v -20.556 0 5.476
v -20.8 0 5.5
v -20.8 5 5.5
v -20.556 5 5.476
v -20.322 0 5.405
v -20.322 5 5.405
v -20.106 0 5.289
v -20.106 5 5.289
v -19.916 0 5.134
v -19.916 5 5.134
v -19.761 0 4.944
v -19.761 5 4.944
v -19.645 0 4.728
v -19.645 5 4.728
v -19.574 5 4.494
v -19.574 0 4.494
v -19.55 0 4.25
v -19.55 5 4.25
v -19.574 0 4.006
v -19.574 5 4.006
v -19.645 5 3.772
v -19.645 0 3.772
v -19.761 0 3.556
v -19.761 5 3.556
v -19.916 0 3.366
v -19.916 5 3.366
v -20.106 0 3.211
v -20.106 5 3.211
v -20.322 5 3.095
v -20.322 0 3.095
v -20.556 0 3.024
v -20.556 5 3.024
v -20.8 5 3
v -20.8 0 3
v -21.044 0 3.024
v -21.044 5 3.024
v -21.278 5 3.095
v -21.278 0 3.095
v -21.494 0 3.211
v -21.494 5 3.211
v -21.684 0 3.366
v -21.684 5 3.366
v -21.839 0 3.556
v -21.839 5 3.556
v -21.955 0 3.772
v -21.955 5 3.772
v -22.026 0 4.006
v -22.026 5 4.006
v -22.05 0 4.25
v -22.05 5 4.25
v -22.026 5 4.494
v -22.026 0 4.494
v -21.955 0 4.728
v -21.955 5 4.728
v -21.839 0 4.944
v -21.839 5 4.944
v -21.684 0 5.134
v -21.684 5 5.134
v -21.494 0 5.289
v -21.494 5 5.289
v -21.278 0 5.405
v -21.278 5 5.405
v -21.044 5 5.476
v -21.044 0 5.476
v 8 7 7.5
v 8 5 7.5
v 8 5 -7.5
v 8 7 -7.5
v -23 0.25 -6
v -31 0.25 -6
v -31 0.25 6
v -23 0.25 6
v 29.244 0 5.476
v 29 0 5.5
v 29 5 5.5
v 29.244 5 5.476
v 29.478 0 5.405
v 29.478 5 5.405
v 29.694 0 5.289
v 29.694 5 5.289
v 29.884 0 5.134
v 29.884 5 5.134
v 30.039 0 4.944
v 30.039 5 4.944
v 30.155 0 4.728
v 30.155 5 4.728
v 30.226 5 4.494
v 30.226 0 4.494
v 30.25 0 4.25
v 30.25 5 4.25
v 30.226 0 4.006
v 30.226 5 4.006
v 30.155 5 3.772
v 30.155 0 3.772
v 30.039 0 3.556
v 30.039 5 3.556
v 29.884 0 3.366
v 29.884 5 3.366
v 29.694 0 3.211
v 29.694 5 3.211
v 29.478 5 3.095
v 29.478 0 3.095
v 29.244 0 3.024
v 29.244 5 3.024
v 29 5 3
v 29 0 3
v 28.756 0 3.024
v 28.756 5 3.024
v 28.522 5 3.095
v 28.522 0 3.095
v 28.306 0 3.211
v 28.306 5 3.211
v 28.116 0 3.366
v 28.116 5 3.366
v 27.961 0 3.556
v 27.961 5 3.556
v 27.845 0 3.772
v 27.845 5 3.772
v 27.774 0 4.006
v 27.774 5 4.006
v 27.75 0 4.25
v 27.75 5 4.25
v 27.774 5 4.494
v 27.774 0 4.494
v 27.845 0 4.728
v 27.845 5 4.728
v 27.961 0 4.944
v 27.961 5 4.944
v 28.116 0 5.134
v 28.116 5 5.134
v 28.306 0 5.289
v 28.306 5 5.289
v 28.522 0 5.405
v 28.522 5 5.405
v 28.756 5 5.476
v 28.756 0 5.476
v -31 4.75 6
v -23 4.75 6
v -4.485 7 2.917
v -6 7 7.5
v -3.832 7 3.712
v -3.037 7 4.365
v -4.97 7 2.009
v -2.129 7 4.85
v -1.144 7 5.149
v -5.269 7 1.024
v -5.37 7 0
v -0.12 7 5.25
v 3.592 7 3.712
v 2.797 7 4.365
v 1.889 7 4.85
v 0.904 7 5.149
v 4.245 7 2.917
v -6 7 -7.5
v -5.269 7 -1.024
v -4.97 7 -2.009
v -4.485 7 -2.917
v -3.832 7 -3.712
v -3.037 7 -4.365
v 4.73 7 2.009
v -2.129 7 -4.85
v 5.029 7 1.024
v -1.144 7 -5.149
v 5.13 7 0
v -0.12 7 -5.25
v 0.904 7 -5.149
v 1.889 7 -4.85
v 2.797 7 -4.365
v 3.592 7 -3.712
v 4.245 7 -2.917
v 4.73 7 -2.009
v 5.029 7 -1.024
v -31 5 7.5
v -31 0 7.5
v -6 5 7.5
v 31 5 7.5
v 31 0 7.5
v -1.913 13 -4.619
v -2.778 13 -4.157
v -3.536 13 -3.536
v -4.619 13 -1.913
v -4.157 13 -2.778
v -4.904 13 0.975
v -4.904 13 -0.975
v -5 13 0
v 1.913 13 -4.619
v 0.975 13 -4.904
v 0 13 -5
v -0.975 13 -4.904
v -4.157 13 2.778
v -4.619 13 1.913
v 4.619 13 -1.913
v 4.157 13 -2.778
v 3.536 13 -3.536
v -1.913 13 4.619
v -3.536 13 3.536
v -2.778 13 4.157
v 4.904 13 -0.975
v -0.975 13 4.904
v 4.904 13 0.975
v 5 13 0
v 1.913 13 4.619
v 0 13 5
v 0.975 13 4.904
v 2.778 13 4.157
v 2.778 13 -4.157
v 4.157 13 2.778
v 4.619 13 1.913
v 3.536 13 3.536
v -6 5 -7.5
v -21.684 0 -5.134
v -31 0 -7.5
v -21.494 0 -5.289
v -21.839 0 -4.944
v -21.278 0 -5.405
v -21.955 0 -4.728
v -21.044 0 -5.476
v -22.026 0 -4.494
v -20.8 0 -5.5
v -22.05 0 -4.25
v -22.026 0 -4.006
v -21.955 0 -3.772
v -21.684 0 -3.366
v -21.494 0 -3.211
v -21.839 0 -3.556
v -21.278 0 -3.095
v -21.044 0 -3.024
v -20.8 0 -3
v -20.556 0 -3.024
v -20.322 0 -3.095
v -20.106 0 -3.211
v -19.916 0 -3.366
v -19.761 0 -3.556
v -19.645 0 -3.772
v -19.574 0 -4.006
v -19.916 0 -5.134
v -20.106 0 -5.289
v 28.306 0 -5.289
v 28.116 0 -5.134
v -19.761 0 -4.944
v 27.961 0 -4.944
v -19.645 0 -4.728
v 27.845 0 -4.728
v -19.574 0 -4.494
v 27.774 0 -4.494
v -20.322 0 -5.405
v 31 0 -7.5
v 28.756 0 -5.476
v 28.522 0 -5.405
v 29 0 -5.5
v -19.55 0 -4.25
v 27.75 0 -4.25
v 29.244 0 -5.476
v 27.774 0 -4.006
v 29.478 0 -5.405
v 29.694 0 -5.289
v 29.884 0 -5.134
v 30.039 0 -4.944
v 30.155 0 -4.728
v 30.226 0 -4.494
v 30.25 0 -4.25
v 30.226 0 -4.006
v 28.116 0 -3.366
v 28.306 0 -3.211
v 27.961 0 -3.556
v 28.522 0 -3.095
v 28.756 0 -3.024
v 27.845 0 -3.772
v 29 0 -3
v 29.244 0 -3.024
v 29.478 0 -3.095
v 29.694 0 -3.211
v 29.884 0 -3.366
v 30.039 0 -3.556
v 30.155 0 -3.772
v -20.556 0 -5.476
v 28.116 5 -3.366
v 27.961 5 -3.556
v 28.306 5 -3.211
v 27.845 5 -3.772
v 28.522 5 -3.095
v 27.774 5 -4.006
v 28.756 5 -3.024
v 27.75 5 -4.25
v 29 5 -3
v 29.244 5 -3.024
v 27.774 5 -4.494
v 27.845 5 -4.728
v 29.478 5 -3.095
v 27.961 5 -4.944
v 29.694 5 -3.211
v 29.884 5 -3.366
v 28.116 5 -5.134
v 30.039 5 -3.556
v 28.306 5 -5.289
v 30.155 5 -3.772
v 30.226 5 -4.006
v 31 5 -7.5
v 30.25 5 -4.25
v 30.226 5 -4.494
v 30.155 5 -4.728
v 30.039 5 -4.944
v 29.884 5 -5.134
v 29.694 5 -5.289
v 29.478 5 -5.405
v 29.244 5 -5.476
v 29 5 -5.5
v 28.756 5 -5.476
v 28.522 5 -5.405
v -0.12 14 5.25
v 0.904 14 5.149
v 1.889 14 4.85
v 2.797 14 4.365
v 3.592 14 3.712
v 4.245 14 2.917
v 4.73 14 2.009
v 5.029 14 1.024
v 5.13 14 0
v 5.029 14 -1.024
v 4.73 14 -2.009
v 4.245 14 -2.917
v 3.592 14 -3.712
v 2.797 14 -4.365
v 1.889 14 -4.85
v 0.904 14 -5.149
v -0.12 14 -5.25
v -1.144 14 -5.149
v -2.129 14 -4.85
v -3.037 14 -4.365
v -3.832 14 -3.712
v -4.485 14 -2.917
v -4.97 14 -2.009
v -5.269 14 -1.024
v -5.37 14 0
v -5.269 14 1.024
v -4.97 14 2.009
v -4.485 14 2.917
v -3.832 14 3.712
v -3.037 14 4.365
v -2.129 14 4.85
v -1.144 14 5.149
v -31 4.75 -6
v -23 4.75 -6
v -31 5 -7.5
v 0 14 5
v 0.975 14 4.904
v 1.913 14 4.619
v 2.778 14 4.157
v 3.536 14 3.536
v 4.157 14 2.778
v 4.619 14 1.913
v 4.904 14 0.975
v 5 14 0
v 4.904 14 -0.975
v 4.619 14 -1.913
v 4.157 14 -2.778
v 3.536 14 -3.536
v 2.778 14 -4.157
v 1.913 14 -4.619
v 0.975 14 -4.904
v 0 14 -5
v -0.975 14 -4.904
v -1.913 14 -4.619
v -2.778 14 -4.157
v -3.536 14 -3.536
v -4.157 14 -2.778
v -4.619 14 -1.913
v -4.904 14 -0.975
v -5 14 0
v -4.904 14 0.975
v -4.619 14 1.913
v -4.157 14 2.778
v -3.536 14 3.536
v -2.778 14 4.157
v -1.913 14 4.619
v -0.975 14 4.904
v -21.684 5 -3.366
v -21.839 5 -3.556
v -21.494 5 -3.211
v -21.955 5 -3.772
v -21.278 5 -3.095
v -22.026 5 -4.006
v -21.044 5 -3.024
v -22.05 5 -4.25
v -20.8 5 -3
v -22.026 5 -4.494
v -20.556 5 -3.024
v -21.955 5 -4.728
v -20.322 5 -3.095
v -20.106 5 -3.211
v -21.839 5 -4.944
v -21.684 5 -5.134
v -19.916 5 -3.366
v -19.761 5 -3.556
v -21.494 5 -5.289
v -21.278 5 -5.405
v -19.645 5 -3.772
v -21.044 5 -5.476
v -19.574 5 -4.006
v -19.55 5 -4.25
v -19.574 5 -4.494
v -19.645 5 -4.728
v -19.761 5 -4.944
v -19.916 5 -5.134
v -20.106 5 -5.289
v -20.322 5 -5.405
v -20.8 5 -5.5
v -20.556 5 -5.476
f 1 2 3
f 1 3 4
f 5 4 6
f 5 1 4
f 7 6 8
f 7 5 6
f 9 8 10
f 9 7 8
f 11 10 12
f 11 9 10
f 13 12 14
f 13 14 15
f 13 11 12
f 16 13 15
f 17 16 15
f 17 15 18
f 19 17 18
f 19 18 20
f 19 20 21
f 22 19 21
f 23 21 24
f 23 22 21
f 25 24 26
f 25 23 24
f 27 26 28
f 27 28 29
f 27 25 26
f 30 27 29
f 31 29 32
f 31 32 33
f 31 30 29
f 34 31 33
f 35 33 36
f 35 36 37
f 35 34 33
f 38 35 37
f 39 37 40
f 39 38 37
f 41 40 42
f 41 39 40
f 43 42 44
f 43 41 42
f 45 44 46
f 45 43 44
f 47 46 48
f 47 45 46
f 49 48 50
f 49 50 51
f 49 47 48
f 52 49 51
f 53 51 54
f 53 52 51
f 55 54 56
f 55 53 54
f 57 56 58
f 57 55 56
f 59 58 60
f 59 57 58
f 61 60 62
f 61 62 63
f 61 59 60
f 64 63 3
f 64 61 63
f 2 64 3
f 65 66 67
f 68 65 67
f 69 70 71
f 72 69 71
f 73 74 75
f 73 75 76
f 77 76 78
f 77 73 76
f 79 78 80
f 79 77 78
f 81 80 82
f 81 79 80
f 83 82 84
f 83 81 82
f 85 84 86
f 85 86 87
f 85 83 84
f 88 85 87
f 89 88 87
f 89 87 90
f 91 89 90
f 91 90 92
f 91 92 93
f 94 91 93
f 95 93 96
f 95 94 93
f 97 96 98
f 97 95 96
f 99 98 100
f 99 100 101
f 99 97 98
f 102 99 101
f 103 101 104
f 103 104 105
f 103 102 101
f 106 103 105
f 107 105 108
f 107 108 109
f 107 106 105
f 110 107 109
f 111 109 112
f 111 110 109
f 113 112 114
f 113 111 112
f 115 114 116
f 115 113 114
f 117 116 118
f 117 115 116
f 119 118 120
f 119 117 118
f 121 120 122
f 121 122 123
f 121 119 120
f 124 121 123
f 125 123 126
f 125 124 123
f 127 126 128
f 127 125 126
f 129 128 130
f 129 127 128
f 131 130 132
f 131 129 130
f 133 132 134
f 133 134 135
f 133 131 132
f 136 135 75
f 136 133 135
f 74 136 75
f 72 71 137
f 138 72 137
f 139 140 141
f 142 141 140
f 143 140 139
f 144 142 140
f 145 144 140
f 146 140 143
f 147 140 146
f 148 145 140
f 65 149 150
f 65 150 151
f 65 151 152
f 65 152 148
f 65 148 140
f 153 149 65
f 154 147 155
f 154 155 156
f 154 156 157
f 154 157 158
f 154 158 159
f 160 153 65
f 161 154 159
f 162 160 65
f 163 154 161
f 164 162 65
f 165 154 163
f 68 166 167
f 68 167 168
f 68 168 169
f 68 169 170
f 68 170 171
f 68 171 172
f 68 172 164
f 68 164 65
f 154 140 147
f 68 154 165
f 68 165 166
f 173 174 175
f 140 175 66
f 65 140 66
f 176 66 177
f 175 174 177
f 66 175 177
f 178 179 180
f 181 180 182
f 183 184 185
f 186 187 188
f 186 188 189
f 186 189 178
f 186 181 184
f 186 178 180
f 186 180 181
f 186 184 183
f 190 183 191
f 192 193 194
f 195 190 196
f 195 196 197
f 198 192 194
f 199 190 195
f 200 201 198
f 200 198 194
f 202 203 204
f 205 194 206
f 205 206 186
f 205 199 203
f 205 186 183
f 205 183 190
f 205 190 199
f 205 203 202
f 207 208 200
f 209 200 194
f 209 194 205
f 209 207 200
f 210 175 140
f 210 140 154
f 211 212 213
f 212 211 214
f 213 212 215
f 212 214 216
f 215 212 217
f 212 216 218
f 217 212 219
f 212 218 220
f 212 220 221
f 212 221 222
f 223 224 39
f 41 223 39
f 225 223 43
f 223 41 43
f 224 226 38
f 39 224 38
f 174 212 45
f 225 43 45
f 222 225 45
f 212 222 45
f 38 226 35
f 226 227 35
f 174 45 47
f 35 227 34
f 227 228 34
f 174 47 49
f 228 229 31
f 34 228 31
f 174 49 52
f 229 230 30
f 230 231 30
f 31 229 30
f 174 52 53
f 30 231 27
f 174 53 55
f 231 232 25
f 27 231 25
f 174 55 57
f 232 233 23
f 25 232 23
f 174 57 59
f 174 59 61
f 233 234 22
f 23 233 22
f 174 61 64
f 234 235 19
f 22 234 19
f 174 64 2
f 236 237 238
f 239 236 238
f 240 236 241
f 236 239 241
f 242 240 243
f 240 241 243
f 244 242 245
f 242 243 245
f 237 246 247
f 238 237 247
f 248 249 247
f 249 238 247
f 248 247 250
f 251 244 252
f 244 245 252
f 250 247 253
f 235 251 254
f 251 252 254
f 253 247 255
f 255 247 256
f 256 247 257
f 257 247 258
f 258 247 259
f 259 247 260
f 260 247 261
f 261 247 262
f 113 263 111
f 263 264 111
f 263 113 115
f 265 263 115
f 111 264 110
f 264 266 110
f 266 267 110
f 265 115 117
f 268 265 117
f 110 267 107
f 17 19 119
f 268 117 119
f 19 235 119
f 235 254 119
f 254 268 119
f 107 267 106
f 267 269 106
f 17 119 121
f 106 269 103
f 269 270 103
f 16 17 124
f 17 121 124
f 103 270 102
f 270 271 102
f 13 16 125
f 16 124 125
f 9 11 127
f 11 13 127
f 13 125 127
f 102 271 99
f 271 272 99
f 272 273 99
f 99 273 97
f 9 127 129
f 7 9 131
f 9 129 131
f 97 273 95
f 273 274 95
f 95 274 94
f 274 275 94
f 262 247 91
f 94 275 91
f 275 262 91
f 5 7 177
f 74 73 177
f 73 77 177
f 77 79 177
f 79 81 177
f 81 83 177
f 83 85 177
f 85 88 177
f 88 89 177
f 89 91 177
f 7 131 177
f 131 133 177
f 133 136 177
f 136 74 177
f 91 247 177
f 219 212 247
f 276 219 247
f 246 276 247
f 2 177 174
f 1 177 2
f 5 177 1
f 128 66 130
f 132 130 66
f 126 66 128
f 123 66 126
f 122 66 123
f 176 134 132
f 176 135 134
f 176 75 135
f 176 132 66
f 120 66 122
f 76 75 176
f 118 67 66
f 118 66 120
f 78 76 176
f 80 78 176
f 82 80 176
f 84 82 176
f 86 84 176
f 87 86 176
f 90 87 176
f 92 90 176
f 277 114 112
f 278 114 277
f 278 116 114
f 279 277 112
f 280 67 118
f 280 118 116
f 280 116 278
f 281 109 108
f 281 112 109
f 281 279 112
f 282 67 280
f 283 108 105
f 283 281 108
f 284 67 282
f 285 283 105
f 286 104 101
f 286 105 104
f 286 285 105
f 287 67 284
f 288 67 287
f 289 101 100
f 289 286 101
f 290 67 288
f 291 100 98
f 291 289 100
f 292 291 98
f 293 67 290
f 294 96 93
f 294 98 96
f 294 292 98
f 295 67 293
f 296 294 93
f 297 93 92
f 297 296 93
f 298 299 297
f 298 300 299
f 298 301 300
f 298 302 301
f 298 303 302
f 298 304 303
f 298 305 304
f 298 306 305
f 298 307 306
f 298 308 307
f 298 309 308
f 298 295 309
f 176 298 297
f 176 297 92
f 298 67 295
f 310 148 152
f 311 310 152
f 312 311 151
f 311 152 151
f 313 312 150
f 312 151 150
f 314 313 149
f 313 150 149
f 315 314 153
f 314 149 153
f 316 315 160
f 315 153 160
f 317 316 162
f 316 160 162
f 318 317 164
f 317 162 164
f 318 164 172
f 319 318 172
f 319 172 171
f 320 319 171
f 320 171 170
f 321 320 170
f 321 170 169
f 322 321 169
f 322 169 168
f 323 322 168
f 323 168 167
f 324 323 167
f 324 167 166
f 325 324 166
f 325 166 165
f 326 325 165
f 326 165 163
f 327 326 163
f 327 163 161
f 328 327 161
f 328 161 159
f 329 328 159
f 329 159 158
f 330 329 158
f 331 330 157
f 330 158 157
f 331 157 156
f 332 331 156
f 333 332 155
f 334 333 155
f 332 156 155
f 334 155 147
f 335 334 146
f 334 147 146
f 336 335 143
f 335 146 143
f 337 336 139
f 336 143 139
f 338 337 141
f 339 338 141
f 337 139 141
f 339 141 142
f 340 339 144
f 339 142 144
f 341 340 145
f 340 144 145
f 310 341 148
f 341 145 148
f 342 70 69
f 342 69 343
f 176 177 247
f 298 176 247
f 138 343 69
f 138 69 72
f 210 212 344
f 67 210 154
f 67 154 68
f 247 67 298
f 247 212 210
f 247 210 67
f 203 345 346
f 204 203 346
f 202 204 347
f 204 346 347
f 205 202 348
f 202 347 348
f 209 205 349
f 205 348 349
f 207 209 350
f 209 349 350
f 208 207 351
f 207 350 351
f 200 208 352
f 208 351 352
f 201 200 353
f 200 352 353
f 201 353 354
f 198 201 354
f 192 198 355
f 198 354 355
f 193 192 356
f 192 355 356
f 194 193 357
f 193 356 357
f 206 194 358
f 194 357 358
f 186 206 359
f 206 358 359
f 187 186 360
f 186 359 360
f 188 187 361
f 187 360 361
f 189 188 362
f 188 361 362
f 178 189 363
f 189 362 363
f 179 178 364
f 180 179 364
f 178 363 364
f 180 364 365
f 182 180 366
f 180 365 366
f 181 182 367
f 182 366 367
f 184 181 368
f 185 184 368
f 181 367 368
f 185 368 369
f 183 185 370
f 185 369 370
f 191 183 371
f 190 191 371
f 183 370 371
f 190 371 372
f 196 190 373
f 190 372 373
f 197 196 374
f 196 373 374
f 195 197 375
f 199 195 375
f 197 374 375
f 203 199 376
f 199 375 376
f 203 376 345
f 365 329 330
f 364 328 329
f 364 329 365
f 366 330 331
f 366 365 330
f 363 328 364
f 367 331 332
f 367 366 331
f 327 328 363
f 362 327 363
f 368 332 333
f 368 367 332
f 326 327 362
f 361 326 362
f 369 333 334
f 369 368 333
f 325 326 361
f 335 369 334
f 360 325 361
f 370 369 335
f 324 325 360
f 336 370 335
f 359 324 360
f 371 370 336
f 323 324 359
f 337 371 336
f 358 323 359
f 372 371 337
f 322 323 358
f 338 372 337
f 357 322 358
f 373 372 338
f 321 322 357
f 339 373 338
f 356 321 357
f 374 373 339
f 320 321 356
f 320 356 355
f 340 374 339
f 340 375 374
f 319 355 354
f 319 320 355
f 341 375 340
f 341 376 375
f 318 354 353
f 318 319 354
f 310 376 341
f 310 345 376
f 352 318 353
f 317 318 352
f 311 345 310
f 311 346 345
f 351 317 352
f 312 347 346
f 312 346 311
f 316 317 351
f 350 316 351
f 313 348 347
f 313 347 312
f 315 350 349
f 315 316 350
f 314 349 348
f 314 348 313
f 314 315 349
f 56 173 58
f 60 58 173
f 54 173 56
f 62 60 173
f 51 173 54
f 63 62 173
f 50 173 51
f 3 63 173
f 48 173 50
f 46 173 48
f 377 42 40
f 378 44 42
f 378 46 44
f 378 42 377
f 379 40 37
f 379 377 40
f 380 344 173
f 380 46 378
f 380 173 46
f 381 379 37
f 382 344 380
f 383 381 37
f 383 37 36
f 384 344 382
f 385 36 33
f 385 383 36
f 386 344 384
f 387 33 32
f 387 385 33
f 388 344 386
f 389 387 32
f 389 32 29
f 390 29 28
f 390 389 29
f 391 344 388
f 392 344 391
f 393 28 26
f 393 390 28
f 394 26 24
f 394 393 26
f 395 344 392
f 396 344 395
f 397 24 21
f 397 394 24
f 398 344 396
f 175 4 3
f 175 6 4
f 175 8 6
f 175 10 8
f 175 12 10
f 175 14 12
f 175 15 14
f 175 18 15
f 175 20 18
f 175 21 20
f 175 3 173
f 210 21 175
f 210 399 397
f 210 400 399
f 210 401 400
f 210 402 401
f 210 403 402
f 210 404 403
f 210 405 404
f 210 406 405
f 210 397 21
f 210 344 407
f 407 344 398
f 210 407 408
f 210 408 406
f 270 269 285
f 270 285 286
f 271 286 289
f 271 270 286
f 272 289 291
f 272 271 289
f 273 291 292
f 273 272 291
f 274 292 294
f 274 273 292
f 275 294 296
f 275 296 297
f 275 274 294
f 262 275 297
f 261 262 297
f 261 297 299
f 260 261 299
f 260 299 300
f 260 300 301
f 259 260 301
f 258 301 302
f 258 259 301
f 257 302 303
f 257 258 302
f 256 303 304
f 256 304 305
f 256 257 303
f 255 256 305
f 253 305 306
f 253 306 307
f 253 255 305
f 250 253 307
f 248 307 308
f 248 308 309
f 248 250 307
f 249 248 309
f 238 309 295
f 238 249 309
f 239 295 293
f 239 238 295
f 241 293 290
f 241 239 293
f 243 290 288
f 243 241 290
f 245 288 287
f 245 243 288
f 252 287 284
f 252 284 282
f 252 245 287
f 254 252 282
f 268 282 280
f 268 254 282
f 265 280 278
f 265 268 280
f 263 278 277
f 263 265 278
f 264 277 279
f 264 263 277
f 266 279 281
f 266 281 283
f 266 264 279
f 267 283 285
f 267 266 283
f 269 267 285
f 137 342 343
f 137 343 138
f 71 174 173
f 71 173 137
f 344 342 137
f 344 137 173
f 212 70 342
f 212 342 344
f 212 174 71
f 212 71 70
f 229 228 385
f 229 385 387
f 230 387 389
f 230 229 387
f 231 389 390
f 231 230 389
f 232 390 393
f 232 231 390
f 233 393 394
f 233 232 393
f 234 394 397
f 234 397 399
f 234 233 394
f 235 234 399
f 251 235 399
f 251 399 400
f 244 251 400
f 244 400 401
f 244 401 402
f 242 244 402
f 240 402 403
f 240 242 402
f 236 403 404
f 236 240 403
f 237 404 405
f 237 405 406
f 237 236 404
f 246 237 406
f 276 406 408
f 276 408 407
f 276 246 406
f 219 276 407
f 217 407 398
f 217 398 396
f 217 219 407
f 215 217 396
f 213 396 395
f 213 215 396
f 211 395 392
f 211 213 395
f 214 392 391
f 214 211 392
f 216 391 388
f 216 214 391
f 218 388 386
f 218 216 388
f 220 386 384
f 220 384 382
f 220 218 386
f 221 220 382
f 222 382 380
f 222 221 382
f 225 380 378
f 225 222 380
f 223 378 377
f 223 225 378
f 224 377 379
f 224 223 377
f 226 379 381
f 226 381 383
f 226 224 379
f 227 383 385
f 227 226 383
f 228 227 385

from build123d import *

# Parameters (mm, degrees)
SKETCH1_W           = 62
SKETCH1_H           = 15
SKETCH1_R           = 5.25
BOSS_EXTRUDE1_DEPTH = 5
SKETCH1_7_R         = 1.25
CUT_EXTRUDE1_DEPTH  = 5
SKETCH1_8_W         = 14
SKETCH1_8_H         = 15
BOSS_EXTRUDE2_DEPTH = 7
SKETCH1_9_R         = 5.25
BOSS_EXTRUDE3_DEPTH = 14
SKETCH2_R           = 5
CUT_EXTRUDE2_DEPTH  = 1
SKETCH3_W           = 12
SKETCH3_H           = 4.5
CUT_EXTRUDE4_DEPTH  = 8


with BuildPart() as part:
    # Sketch1 → Boss-Extrude1 (new body)
    with BuildSketch(Plane(origin=(0, 0, 0), x_dir=(1, 0, 0), z_dir=(0, 1, 0))):
        Rectangle(SKETCH1_W, SKETCH1_H)
        with Locations((-0.12, 0)):
            Circle(SKETCH1_R, mode=Mode.SUBTRACT)
    extrude(amount=BOSS_EXTRUDE1_DEPTH)

    # Sketch1<7> → Cut-Extrude1 (cut)
    with BuildSketch(Plane(origin=(0, 0, 0), x_dir=(1, 0, 0), z_dir=(0, 1, 0))):
        with Locations((29, 4.25)):
            Circle(SKETCH1_7_R)
        with Locations((29, -4.25)):
            Circle(SKETCH1_7_R)
        with Locations((-20.8, 4.25)):
            Circle(SKETCH1_7_R)
        with Locations((-20.8, -4.25)):
            Circle(SKETCH1_7_R)
    extrude(amount=CUT_EXTRUDE1_DEPTH, mode=Mode.SUBTRACT)

    # Sketch1<8> → Boss-Extrude2 (add)
    with BuildSketch(Plane(origin=(0, 0, 0), x_dir=(1, 0, 0), z_dir=(0, 1, 0))):
        with Locations((1, 0)):
            Rectangle(SKETCH1_8_W, SKETCH1_8_H)
    extrude(amount=BOSS_EXTRUDE2_DEPTH)

    # Sketch1<9> → Boss-Extrude3 (add)
    with BuildSketch(Plane(origin=(0, 0, 0), x_dir=(1, 0, 0), z_dir=(0, 1, 0))):
        with Locations((-0.12, 0)):
            Circle(SKETCH1_9_R)
    extrude(amount=BOSS_EXTRUDE3_DEPTH)

    # Sketch2 → Cut-Extrude2 (cut)
    with BuildSketch(Plane(origin=(0, 14, 0), x_dir=(1, 0, 0), z_dir=(0, 1, 0))):
        Circle(SKETCH2_R)
    extrude(amount=-CUT_EXTRUDE2_DEPTH, mode=Mode.SUBTRACT)

    # Sketch3 → Cut-Extrude4 (cut)
    with BuildSketch(Plane.ZY.offset(31)):
        with Locations((0, 2.5)):
            Rectangle(SKETCH3_W, SKETCH3_H)
    extrude(amount=-CUT_EXTRUDE4_DEPTH, mode=Mode.SUBTRACT)


solid = part.part
